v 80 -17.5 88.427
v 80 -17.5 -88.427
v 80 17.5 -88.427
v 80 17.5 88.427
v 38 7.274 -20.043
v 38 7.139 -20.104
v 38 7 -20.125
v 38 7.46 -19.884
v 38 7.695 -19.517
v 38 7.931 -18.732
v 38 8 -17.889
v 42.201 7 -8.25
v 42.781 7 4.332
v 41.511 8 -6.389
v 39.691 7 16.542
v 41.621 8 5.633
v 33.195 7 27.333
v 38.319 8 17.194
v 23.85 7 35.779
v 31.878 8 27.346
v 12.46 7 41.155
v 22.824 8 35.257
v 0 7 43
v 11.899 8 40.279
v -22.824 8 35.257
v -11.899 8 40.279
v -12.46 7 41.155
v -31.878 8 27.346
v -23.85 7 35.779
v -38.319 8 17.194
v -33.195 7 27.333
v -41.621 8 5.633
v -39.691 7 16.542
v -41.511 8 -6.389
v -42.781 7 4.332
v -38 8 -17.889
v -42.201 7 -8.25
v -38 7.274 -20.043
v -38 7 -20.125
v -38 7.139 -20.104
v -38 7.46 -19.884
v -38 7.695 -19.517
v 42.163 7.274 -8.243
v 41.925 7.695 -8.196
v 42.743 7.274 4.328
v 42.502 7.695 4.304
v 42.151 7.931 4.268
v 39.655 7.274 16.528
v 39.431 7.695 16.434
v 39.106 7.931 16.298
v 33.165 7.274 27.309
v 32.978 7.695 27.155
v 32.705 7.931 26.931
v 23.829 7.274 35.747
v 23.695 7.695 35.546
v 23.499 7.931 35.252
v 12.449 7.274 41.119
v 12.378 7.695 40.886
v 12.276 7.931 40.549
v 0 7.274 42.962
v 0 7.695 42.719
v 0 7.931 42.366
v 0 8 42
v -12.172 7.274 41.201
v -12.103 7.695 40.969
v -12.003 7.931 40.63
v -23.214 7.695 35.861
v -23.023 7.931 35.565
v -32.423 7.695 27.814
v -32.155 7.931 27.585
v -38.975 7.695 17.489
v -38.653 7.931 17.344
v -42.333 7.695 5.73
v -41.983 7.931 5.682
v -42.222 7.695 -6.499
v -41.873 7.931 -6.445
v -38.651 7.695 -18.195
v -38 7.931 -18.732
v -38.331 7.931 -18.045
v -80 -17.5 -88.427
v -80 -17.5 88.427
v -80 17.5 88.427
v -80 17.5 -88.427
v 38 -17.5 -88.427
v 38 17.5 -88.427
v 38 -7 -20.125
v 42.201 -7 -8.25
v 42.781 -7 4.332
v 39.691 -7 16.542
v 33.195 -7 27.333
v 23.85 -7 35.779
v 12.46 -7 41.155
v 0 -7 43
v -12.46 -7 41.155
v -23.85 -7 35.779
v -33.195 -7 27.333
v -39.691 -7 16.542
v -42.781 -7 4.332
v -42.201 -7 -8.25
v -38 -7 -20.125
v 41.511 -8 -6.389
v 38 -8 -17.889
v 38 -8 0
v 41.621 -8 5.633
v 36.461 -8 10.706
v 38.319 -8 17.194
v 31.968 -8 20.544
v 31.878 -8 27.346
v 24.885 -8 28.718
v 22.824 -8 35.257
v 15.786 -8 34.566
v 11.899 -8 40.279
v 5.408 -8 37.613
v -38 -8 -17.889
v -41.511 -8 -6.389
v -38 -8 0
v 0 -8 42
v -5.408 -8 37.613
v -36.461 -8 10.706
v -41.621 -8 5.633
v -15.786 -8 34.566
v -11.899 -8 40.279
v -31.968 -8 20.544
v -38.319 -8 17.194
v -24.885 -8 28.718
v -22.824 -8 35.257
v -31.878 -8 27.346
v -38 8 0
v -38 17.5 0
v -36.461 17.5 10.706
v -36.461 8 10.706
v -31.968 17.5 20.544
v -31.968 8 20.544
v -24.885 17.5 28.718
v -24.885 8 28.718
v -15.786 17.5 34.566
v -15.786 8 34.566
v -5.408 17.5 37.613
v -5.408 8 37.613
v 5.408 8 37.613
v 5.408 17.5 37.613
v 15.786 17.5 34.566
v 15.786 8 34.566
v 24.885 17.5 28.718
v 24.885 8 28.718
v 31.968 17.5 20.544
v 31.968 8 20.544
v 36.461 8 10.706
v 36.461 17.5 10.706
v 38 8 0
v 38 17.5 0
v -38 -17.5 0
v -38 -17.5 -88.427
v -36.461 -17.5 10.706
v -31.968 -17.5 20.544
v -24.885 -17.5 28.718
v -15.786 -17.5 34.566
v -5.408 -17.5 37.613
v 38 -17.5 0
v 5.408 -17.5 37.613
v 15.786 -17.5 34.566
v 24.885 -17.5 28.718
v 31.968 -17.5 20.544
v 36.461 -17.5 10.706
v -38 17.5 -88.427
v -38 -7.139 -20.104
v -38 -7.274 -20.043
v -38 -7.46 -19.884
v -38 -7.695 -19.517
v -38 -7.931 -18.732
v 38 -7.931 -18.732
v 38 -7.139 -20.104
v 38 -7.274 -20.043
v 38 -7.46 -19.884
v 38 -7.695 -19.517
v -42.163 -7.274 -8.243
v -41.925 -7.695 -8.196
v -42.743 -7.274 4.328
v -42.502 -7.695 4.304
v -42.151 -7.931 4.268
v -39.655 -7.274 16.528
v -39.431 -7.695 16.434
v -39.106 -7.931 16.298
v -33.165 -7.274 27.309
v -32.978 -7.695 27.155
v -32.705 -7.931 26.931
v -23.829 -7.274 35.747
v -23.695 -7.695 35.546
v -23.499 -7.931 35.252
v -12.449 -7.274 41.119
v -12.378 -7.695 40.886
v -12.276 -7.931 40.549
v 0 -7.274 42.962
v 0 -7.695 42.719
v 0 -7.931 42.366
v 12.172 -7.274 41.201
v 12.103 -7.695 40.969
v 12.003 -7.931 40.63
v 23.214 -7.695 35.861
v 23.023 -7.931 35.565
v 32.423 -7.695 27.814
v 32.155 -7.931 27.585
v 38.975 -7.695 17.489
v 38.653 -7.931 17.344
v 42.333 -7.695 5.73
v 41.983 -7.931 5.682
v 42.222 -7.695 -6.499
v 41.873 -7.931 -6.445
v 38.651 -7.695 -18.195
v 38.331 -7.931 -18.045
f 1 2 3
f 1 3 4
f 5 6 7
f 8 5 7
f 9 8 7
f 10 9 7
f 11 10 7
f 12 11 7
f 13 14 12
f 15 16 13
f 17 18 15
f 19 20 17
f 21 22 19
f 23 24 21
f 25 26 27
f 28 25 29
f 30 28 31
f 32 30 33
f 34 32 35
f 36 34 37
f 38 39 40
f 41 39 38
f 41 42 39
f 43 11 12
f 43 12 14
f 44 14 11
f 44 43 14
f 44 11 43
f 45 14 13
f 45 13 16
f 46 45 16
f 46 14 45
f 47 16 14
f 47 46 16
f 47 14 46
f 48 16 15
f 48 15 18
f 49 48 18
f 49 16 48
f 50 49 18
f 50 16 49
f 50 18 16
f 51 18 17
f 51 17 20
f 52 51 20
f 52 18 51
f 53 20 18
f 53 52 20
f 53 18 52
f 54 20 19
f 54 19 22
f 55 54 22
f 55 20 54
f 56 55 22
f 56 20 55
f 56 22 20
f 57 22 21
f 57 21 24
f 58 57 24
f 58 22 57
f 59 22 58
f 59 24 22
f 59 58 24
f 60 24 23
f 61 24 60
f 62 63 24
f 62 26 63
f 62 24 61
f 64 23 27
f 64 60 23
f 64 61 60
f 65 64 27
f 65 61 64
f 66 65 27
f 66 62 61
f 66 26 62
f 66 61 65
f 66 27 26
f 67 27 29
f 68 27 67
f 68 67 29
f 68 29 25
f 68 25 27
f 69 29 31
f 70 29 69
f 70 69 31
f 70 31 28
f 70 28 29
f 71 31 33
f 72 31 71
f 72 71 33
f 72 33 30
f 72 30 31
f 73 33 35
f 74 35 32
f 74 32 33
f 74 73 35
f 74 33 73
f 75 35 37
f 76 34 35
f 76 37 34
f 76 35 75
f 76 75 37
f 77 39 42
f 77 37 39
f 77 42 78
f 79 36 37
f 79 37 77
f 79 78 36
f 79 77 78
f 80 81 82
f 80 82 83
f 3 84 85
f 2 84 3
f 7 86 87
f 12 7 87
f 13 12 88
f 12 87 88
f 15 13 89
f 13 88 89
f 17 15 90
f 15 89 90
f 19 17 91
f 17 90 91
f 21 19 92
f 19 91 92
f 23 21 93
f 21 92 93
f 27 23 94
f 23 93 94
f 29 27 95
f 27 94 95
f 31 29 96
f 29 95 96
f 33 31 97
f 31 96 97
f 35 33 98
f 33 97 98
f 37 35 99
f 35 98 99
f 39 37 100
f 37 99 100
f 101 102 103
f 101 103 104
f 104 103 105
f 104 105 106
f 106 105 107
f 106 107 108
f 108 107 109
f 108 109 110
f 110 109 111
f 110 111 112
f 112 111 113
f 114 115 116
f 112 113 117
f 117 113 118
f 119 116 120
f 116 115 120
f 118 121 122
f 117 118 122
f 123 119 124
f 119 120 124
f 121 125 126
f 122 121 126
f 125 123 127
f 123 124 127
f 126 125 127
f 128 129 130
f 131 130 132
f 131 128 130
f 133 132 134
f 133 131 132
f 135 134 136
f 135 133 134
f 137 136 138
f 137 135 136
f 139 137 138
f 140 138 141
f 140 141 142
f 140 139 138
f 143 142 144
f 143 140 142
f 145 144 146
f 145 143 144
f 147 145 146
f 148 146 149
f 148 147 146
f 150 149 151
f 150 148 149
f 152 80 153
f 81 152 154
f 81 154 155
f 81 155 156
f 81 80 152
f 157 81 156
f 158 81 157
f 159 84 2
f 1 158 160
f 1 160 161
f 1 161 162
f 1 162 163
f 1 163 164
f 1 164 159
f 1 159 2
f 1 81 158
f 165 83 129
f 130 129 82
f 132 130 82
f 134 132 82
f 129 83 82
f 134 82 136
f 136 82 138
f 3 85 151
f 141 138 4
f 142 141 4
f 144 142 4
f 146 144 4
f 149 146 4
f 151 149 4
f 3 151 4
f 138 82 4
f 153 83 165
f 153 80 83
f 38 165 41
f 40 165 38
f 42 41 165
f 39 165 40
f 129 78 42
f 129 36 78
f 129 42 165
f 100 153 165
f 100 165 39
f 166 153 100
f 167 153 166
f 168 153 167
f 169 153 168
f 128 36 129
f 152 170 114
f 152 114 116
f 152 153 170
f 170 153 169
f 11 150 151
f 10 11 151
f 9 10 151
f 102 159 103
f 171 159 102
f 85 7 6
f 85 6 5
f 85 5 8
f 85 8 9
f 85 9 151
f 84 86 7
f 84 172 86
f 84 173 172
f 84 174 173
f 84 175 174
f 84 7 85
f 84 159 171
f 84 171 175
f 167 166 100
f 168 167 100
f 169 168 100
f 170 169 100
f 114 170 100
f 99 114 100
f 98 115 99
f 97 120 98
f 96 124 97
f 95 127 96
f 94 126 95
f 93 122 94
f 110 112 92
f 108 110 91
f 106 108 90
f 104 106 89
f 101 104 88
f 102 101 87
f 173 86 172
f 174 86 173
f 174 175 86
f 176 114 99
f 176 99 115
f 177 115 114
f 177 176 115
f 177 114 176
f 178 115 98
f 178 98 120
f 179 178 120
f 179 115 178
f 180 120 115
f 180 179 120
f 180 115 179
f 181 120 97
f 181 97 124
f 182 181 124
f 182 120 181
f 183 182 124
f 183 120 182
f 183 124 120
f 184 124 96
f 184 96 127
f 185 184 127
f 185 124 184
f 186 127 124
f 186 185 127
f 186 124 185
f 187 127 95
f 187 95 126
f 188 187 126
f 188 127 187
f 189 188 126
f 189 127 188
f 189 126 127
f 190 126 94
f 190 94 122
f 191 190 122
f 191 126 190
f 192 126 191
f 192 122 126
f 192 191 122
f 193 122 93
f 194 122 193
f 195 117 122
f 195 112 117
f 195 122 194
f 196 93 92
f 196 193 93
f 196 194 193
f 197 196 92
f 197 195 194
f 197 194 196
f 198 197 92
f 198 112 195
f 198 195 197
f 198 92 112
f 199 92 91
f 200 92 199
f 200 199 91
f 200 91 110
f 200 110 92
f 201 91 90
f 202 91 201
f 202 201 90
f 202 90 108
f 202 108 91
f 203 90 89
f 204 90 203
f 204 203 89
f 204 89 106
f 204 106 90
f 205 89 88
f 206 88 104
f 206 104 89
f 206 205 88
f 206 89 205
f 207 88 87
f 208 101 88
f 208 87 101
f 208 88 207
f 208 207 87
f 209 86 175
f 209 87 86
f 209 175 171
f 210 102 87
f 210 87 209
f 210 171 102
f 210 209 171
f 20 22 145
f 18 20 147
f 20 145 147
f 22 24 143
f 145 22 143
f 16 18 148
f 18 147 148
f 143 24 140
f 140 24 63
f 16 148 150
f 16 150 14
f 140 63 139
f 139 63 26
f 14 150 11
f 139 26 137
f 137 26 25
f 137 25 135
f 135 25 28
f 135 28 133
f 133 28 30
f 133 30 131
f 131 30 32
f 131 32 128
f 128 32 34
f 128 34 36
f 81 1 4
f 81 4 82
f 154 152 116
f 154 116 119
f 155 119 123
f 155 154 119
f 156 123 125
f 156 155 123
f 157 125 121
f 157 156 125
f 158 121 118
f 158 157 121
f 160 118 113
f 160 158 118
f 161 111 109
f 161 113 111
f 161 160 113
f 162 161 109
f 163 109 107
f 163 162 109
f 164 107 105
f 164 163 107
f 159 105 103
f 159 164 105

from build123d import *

# Parameters (mm, degrees)
F1_DEPTH = 17.5
F4_R     = 1
F5_R     = 1


with BuildPart() as f1:
    # F0 (on Front) → F1 (new body, symmetric)
    with BuildSketch(Plane.XZ):
        with BuildLine():
            ThreePointArc((-38, 0), (0, 38), (38, 0))
            Line((38, 0), (38, -88.42741))
            Line((38, -88.42741), (80, -88.42741))
            Line((80, -88.42741), (80, 88.42741))
            Line((80, 88.42741), (-80, 88.42741))
            Line((-80, 88.42741), (-80, -88.42741))
            Line((-80, -88.42741), (-38, -88.42741))
            Line((-38, -88.42741), (-38, 0))
        make_face()
    extrude(amount=F1_DEPTH, both=True)

    # F2 (on Right) → F3 (revolve, cut)
    with BuildSketch(Plane.YZ):
        Polygon((-8, 43), (-8, 32.880556), (8, 32.880556), (8, 43), (0, 43), align=None)
    revolve(axis=Axis((0, 0, 0), (0, -1, 0)), mode=Mode.SUBTRACT)

    # F4
    f4_edges = [f1.edges().sort_by_distance(p)[0] for p in [
        (0, 8, 43),
    ]]
    fillet(f4_edges, radius=F4_R)

    # F5
    f5_edges = [f1.edges().sort_by_distance(p)[0] for p in [
        (0, -8, 43),
    ]]
    fillet(f5_edges, radius=F5_R)


solid = f1.part
